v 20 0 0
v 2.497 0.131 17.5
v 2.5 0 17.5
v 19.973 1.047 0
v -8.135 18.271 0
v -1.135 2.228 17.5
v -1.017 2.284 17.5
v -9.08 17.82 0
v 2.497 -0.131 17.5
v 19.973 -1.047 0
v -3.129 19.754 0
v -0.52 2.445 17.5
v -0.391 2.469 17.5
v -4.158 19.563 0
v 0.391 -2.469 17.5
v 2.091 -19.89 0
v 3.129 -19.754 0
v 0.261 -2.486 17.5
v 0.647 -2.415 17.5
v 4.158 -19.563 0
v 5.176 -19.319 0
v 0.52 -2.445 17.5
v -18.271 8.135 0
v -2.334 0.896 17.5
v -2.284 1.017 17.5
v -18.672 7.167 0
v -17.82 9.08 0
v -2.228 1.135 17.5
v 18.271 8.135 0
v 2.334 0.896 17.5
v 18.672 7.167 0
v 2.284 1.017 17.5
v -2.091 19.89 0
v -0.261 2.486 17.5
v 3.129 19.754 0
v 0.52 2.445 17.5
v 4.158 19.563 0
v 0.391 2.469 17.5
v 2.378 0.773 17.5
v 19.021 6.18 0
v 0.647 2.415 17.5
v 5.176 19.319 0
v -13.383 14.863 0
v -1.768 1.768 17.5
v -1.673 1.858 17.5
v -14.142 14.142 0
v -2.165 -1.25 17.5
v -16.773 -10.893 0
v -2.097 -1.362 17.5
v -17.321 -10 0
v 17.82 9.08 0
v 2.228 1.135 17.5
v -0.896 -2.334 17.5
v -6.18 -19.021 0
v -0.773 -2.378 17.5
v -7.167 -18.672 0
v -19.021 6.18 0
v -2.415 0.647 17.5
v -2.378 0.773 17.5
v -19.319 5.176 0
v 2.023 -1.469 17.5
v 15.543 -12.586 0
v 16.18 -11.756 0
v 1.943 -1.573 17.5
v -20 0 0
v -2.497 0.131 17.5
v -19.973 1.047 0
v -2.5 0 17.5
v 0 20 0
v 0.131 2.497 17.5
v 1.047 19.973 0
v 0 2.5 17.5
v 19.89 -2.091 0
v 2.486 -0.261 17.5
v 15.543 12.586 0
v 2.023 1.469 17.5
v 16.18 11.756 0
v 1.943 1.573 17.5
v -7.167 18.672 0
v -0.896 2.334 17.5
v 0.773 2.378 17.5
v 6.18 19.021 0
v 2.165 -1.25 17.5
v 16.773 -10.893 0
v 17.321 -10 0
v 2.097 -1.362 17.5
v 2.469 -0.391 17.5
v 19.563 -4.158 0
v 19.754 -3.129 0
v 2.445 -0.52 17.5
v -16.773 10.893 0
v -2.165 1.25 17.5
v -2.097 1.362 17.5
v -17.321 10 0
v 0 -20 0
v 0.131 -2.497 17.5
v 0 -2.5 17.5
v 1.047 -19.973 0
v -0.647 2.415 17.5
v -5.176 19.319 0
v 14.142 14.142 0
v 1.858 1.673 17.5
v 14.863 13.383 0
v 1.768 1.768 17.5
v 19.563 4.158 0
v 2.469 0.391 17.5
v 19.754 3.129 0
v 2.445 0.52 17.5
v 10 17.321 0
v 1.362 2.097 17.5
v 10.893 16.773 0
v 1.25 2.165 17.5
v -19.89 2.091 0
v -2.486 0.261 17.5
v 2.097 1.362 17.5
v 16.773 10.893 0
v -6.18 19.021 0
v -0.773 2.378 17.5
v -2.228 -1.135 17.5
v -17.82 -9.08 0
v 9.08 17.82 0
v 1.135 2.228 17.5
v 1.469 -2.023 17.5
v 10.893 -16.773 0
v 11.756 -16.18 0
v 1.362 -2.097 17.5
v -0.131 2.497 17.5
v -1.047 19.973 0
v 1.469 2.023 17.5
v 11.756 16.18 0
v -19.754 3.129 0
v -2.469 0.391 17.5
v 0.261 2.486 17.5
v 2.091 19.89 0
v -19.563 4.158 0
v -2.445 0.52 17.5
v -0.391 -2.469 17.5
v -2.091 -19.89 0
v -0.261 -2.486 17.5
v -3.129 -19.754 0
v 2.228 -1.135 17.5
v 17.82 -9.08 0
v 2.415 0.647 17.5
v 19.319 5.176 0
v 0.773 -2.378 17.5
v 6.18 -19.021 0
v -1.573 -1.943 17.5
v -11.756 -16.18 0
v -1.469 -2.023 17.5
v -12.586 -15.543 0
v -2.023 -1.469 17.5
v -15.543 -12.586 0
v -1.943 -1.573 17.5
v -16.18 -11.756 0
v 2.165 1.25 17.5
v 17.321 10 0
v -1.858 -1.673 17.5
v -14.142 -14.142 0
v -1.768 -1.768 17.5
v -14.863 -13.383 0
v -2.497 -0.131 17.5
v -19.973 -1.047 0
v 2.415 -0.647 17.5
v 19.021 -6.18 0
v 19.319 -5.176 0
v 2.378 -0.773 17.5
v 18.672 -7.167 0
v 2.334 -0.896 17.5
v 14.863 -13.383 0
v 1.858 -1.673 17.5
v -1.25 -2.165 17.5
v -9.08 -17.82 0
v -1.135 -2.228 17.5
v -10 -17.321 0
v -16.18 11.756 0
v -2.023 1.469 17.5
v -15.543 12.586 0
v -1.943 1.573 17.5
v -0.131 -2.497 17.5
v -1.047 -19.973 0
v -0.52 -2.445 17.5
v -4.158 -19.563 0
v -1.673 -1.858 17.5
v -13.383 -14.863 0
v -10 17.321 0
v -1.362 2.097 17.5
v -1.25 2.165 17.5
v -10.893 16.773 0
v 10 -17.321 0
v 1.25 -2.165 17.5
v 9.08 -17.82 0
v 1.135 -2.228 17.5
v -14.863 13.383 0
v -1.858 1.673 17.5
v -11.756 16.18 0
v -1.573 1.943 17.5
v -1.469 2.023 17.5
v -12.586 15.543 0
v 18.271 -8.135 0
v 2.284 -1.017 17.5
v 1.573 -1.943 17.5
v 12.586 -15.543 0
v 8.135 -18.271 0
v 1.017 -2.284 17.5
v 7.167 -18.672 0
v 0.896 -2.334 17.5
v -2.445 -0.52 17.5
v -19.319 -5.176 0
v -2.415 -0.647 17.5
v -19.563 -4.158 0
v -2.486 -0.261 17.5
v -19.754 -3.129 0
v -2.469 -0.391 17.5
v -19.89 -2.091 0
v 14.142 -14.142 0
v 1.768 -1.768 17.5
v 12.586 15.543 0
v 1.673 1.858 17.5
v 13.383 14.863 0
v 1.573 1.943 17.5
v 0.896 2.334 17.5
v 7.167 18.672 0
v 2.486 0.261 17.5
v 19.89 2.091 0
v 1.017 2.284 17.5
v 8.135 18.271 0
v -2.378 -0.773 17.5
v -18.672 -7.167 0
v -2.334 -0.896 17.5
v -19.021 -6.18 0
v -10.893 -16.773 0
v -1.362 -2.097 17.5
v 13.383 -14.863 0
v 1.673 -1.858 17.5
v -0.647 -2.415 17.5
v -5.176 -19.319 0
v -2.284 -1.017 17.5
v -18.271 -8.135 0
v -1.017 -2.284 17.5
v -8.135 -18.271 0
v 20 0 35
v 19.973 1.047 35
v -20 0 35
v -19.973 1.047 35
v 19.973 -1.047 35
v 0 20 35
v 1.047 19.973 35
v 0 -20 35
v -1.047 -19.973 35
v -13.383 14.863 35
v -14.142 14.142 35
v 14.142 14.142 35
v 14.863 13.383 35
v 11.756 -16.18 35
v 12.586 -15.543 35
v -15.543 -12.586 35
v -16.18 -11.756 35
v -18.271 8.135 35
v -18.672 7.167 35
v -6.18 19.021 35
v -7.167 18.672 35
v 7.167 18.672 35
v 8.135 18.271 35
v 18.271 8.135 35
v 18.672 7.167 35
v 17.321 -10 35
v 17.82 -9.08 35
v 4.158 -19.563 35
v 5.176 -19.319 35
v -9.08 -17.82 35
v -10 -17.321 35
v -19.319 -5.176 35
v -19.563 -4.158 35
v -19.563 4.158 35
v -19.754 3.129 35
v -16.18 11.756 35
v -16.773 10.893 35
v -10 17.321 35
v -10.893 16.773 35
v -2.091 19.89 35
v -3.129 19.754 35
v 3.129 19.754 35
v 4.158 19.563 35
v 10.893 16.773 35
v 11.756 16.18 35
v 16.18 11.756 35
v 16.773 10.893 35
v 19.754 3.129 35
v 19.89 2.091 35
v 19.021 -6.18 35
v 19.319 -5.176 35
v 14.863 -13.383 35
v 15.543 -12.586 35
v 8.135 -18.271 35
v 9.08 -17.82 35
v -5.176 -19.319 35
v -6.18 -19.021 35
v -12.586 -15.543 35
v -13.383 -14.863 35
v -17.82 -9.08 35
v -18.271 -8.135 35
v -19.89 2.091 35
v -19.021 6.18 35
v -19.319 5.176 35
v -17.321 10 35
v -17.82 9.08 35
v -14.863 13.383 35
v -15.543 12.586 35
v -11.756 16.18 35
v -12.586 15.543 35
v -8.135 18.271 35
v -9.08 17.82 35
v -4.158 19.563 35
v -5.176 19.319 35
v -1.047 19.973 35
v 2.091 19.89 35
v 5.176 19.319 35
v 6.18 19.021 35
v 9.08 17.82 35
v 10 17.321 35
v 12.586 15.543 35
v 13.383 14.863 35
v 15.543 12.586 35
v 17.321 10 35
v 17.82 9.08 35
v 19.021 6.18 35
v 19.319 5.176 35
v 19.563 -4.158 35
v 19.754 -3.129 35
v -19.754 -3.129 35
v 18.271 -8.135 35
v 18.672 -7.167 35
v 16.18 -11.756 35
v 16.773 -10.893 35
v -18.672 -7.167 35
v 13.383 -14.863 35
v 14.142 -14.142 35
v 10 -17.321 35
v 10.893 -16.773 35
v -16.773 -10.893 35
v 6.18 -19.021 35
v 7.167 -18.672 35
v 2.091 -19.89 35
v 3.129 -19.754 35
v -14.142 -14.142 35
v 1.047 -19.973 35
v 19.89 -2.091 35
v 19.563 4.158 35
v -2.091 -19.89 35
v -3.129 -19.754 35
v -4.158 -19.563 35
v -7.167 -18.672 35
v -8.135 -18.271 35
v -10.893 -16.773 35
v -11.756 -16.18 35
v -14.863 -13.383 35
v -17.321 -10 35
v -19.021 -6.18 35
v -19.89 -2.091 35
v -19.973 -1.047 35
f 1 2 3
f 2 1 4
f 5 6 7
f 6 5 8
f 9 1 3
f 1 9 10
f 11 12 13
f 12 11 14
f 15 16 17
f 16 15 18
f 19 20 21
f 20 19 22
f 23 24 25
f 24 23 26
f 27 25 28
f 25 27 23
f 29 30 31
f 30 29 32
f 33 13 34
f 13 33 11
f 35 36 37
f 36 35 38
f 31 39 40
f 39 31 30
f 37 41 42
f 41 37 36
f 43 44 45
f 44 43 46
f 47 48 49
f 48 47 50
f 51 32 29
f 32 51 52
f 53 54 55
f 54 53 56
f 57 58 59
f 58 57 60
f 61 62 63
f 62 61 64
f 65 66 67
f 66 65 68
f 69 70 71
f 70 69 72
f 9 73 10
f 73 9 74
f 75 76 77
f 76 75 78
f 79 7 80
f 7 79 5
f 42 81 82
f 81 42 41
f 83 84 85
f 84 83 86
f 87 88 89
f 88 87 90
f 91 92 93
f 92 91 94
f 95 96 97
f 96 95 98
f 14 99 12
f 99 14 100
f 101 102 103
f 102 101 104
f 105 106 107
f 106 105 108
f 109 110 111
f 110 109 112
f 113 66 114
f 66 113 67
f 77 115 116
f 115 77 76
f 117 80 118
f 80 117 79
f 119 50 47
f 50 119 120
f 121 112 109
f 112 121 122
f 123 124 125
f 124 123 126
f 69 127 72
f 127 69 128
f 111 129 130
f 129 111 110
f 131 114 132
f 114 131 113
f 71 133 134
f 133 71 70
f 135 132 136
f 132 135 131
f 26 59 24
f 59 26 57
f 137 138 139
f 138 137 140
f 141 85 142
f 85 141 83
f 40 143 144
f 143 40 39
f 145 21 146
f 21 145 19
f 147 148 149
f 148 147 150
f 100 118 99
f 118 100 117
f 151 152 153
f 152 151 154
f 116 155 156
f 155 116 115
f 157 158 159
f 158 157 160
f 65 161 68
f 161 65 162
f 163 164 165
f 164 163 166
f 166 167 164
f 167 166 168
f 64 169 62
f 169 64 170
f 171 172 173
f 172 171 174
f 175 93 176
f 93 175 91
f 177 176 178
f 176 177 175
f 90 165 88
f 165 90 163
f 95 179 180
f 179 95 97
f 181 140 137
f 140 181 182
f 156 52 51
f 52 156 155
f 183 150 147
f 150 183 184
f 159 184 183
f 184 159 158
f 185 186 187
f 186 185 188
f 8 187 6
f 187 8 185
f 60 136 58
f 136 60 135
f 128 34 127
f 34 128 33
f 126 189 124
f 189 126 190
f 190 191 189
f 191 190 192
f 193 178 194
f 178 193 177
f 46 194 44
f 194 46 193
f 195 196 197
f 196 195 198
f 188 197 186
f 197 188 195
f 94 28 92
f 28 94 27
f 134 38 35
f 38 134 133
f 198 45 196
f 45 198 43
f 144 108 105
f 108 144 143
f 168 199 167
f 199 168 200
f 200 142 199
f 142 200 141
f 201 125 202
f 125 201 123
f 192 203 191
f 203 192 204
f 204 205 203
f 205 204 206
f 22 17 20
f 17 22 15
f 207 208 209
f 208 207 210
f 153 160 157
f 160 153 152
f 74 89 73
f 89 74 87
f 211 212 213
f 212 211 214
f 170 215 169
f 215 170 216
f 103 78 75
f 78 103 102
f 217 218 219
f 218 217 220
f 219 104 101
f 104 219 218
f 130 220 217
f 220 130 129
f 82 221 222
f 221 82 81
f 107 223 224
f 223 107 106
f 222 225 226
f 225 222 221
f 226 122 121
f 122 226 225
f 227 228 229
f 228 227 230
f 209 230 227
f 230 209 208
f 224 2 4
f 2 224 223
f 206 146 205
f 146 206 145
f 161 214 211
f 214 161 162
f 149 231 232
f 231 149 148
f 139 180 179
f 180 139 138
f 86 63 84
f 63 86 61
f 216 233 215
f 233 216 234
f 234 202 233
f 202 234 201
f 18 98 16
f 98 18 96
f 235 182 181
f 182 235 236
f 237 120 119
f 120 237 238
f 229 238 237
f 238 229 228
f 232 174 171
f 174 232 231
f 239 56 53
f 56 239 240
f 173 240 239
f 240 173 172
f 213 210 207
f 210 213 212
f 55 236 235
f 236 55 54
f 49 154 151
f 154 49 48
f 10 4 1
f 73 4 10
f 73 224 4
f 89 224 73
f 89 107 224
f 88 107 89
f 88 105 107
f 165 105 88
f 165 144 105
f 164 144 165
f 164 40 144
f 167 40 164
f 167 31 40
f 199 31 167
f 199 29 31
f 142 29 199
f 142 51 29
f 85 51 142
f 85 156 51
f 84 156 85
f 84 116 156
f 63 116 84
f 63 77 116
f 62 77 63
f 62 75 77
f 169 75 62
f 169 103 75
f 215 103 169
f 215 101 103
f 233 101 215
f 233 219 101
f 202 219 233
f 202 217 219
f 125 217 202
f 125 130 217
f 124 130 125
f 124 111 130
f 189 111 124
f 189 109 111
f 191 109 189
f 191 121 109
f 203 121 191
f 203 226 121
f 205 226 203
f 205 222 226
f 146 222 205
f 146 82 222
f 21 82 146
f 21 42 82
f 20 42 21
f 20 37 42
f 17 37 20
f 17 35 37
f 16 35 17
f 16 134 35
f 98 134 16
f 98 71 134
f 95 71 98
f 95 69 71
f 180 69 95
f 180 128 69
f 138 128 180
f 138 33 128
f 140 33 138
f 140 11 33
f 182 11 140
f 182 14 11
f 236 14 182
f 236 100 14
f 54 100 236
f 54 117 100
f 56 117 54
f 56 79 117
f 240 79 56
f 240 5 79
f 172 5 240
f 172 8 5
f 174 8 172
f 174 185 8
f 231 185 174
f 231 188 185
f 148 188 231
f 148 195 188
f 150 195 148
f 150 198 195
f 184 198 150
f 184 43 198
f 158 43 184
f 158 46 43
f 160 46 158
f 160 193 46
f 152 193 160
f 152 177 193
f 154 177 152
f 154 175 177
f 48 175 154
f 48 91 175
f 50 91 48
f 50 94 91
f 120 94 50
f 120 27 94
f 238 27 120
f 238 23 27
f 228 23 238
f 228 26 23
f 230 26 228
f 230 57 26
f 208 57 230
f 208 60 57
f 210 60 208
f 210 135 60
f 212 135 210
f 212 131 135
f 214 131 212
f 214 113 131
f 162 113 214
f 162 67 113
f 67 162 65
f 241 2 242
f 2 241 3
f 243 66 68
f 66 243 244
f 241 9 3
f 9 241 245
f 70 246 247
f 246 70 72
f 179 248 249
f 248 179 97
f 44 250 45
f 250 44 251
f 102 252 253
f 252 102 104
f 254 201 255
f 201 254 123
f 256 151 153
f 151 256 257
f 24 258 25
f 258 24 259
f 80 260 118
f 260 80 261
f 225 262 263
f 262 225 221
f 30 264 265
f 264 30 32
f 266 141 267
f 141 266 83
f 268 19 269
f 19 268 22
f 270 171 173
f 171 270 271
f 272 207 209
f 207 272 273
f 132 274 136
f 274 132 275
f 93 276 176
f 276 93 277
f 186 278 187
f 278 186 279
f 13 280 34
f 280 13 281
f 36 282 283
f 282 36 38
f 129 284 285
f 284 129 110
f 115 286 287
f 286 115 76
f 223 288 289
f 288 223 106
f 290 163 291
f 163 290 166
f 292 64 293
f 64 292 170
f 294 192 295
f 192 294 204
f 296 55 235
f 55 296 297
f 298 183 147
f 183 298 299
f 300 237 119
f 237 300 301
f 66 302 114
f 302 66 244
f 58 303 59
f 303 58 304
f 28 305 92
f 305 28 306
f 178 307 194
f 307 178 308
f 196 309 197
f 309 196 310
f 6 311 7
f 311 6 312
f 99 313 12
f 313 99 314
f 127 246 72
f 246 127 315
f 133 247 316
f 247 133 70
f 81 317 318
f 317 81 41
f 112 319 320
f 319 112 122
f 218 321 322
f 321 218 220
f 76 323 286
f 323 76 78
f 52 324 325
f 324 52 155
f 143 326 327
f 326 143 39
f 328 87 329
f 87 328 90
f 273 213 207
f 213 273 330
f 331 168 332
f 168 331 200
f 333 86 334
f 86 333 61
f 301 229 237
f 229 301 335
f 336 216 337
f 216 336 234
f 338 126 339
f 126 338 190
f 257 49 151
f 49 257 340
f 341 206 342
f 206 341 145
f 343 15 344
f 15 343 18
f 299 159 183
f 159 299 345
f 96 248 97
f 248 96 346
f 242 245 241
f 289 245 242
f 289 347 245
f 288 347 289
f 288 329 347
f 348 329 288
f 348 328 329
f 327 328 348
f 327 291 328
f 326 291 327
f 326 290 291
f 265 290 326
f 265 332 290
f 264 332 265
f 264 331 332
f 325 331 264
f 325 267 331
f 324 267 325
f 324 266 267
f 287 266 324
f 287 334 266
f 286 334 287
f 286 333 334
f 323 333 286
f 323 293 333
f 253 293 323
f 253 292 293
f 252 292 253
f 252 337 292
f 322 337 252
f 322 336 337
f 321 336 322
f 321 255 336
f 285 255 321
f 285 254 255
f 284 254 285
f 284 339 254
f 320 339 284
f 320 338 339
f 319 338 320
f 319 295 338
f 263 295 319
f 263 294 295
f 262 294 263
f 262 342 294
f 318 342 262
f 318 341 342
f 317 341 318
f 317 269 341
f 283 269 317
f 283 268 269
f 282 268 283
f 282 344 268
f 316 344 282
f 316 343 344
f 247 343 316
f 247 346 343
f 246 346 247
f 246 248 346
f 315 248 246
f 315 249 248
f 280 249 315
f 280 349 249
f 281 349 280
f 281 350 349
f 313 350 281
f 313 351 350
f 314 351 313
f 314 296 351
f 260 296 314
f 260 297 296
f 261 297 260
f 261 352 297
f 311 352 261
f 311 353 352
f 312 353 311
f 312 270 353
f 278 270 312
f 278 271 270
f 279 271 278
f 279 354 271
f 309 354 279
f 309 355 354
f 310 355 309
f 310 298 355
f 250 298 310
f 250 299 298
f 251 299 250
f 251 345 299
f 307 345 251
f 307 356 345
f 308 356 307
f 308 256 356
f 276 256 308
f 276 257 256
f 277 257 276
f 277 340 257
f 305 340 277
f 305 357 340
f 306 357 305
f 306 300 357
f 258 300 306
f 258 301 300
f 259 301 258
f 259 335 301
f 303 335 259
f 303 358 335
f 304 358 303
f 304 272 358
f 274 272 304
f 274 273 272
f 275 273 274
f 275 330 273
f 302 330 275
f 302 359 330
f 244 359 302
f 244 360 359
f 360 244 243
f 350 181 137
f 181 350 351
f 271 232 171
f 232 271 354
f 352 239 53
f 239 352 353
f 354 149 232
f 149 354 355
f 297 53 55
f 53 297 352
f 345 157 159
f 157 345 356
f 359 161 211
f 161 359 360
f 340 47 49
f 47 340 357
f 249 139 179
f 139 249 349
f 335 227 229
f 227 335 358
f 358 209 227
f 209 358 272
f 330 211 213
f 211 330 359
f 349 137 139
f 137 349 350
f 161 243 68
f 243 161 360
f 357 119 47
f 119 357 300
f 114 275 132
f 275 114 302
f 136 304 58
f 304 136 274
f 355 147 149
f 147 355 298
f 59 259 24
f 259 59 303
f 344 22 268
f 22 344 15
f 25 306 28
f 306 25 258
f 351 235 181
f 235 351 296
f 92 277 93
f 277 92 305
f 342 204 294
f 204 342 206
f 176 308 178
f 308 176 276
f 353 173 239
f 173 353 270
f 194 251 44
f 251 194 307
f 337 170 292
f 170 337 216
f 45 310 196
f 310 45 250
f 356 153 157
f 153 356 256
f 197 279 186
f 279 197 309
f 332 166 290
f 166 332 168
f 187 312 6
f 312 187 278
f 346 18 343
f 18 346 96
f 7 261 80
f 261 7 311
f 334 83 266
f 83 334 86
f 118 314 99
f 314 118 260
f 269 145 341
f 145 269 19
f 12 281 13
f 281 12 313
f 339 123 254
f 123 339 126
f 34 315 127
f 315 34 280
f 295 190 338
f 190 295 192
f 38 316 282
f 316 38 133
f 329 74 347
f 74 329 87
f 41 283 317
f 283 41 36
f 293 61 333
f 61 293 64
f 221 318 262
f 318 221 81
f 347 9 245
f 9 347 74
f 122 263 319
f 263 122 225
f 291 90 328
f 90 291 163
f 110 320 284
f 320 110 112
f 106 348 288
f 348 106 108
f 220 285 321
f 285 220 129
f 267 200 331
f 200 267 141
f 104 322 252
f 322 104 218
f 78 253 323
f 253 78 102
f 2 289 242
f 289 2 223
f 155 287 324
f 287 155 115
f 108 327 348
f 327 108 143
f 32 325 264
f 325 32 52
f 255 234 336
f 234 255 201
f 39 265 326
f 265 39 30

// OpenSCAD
$fa = 3;
$fs = 1;

cylinder(r1=20, r2=0, h=20);
translate([0, 0, 15]) {
	cylinder(r1=0, r2=20, h=20);
}
